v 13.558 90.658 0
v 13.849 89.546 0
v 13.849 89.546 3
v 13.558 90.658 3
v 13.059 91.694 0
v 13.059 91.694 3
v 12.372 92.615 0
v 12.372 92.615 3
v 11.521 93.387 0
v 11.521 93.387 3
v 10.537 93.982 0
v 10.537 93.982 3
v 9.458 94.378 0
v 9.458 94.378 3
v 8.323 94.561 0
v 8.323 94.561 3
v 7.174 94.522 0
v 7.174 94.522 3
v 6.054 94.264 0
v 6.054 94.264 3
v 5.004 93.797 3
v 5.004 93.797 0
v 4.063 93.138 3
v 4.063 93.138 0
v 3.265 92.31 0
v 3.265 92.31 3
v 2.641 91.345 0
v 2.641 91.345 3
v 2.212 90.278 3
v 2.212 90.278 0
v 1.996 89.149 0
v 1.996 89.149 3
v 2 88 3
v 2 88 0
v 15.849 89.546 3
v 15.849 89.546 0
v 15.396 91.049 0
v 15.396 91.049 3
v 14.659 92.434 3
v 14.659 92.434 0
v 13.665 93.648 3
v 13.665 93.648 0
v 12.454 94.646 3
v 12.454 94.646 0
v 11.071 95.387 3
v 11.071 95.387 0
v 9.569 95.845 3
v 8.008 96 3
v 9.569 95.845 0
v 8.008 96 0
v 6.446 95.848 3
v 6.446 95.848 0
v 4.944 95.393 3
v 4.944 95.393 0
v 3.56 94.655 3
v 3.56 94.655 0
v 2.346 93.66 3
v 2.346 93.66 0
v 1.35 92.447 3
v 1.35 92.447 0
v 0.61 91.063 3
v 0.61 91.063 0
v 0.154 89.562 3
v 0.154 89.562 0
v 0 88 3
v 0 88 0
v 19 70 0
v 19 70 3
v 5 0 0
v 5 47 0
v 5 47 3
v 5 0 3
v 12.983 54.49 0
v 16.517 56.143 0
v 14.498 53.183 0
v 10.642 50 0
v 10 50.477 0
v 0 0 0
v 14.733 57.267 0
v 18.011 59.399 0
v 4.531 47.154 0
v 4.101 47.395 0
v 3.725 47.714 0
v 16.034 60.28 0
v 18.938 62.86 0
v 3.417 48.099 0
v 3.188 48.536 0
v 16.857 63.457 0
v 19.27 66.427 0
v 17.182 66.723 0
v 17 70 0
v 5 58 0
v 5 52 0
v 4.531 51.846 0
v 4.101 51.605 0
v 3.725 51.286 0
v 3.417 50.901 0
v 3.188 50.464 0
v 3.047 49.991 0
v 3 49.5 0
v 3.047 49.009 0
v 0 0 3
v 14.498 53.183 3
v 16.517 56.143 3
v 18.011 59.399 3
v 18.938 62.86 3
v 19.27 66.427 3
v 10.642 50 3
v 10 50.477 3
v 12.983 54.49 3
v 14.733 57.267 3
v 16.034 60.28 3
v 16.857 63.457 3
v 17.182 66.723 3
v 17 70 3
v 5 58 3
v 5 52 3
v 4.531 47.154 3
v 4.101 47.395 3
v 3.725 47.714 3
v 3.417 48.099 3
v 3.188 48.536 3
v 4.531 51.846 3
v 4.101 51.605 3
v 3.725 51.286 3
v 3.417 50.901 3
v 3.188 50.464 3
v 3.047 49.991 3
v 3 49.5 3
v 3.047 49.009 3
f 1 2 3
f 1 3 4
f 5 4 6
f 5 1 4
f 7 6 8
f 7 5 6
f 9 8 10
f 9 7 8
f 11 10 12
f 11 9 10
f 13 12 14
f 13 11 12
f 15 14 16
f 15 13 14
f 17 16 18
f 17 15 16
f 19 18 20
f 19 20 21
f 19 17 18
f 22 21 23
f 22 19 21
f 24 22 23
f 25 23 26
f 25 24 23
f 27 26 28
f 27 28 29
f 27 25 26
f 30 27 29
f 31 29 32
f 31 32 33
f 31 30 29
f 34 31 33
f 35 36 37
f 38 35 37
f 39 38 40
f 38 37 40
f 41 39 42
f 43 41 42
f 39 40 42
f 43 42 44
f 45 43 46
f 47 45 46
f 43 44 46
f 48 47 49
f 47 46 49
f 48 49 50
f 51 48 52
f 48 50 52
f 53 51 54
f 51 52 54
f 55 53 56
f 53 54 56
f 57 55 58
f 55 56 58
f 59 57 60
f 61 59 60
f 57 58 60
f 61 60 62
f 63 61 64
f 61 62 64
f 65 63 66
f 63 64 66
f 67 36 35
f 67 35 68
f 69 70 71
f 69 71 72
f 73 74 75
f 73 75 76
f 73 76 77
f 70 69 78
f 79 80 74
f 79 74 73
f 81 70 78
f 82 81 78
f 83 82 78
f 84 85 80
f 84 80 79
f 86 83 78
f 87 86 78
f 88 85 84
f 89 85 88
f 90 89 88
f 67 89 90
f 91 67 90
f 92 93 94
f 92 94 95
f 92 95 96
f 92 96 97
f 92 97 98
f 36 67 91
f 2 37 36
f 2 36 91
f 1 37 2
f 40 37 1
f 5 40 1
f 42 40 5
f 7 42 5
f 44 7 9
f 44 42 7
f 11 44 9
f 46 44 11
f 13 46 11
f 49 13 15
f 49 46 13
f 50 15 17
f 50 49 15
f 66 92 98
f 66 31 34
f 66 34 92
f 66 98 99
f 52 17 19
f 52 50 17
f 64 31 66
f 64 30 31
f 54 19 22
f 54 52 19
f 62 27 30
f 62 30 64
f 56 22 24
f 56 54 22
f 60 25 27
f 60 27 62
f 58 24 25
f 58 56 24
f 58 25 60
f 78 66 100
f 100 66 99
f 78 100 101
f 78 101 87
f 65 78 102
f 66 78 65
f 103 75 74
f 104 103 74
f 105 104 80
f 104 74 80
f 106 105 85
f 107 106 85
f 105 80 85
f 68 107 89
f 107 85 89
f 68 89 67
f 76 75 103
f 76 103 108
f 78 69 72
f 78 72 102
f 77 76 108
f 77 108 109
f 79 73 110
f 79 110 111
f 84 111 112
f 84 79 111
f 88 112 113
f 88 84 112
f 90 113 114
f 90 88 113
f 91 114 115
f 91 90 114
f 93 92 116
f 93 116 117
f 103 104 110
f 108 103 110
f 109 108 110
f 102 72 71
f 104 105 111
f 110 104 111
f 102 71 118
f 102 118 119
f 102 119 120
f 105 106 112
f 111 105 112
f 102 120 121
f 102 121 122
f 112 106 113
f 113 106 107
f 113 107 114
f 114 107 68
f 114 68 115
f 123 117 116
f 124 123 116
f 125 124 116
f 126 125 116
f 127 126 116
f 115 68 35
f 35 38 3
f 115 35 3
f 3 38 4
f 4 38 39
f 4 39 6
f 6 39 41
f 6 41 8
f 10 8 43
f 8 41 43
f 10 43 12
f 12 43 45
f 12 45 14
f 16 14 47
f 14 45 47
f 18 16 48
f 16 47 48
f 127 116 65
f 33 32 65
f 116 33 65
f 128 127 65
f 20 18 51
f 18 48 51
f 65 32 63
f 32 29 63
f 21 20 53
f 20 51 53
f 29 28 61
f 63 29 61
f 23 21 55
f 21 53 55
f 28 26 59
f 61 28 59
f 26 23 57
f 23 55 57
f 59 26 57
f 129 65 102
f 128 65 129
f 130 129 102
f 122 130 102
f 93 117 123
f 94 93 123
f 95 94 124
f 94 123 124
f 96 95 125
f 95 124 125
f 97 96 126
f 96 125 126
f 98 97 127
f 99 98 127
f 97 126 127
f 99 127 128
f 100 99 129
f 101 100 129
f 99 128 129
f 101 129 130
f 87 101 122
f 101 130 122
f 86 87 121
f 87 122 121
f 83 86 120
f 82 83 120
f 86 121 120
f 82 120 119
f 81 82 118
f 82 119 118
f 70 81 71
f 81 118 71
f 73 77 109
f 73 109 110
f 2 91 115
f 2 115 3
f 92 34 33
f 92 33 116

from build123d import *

# Parameters (mm, degrees)
PAD_DEPTH    = 3
POCKET_DEPTH = 3.001


with BuildPart() as part:
    # Sketch → Pad (new body)
    with BuildSketch(Plane.XY):
        with BuildLine():
            Line((0, 0), (0, 88))
            ThreePointArc((15.849182, 89.546106), (7.223278, 95.962235), (0, 88))
            Line((15.849182, 89.546106), (19, 70))
            ThreePointArc((14.497745, 53.183248), (18.54727, 61.110149), (19, 70))
            Line((14.497745, 53.183248), (10.641979, 50))
            Line((10.641979, 50), (10, 50.47735))
            Line((10, 50.47735), (12.983436, 54.48972))
            ThreePointArc((12.983436, 54.48972), (16.50721, 61.852406), (17, 70))
            Line((17, 70), (13.849182, 89.546106))
            ThreePointArc((13.849182, 89.546106), (7.174445, 94.522086), (2, 88))
            Line((2, 88), (5, 58))
            Line((5, 58), (5, 0))
            Line((5, 0), (0, 0))
        make_face()
    extrude(amount=PAD_DEPTH)

    # Sketch001 → Pocket (cut, through all)
    with BuildSketch(Plane.XY.offset(3)):
        with BuildLine():
            ThreePointArc((5, 52), (3, 49.5), (5, 47))
            Line((5, 52), (5, 47))
        make_face()
    extrude(amount=-POCKET_DEPTH, mode=Mode.SUBTRACT)


solid = part.part
